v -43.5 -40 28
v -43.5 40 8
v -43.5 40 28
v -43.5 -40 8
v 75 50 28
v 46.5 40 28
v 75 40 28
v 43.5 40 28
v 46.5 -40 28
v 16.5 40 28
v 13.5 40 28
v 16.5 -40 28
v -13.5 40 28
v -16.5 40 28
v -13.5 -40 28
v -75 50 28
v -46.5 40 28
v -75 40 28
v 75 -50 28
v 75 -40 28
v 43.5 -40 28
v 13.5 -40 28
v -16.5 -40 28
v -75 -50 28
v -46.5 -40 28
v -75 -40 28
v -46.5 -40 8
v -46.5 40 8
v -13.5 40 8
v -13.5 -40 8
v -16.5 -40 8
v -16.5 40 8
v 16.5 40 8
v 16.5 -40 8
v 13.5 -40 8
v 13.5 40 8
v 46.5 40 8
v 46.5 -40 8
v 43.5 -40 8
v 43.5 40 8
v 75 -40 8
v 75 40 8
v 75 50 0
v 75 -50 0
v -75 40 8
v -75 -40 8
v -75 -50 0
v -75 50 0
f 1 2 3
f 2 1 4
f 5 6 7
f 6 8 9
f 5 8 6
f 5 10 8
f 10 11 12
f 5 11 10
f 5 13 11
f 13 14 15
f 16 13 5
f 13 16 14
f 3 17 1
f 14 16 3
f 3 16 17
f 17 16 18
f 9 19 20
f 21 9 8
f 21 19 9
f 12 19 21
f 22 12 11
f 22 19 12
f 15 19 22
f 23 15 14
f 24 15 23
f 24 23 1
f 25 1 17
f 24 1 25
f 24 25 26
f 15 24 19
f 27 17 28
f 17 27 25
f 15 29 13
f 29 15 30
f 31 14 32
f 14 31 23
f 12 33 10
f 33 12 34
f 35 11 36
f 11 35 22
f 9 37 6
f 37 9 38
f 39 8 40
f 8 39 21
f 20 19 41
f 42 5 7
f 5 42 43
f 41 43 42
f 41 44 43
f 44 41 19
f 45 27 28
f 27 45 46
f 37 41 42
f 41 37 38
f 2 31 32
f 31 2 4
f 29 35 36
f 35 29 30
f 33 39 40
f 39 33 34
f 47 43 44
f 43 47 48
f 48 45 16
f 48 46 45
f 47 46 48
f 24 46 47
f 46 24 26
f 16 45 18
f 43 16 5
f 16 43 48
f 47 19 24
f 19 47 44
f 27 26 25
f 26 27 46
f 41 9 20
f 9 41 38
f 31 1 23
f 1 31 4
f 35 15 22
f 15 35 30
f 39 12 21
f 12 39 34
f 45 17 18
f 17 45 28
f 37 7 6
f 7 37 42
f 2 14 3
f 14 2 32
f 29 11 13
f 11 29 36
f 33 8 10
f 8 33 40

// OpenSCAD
$fn = 32;

// ----------------------------------------------------------------------
// Rib frame 150 x 100 x 28
// 4 ribs at 30 mm pitch
// ----------------------------------------------------------------------

// --- parameters (mm) ---
frame = [150, 100, 8];  // base plate size (x, y, z)
rail_w = 10;            // side rail width
ribs = 4;               // number of ribs
rib_t = 3;              // rib thickness
rib_h = 20;             // rib height above the base plate
pitch = 30;             // pitch between rib centres

// --- derived feature positions (mm) ---
span = (ribs - 1) * pitch;          // = 90   distance between the outer ribs
origin_x = -span / 2;               // = -45   X of the first rib
rib_len = frame[1] - 2 * rail_w + 2;  // = 82   rib length, 1 mm into each rail
feature_centers = [
  [origin_x + 0 * pitch, 0],
  [origin_x + 1 * pitch, 0],
  [origin_x + 2 * pitch, 0],
  [origin_x + 3 * pitch, 0]
];   // rib centre line, drives the rib loop

// base plate, two side rails, then the ribs read straight off feature_centers
union() {
  translate([-frame[0] / 2, -frame[1] / 2, 0]) cube(frame);
  translate([-frame[0] / 2, -frame[1] / 2, 0]) cube([frame[0], rail_w, frame[2] + rib_h]);
  translate([-frame[0] / 2, frame[1] / 2 - rail_w, 0]) cube([frame[0], rail_w, frame[2] + rib_h]);
  for (centre = feature_centers)
    translate([centre[0] - rib_t / 2, centre[1] - rib_len / 2, frame[2] - 1])
      cube([rib_t, rib_len, rib_h + 1]);
}
